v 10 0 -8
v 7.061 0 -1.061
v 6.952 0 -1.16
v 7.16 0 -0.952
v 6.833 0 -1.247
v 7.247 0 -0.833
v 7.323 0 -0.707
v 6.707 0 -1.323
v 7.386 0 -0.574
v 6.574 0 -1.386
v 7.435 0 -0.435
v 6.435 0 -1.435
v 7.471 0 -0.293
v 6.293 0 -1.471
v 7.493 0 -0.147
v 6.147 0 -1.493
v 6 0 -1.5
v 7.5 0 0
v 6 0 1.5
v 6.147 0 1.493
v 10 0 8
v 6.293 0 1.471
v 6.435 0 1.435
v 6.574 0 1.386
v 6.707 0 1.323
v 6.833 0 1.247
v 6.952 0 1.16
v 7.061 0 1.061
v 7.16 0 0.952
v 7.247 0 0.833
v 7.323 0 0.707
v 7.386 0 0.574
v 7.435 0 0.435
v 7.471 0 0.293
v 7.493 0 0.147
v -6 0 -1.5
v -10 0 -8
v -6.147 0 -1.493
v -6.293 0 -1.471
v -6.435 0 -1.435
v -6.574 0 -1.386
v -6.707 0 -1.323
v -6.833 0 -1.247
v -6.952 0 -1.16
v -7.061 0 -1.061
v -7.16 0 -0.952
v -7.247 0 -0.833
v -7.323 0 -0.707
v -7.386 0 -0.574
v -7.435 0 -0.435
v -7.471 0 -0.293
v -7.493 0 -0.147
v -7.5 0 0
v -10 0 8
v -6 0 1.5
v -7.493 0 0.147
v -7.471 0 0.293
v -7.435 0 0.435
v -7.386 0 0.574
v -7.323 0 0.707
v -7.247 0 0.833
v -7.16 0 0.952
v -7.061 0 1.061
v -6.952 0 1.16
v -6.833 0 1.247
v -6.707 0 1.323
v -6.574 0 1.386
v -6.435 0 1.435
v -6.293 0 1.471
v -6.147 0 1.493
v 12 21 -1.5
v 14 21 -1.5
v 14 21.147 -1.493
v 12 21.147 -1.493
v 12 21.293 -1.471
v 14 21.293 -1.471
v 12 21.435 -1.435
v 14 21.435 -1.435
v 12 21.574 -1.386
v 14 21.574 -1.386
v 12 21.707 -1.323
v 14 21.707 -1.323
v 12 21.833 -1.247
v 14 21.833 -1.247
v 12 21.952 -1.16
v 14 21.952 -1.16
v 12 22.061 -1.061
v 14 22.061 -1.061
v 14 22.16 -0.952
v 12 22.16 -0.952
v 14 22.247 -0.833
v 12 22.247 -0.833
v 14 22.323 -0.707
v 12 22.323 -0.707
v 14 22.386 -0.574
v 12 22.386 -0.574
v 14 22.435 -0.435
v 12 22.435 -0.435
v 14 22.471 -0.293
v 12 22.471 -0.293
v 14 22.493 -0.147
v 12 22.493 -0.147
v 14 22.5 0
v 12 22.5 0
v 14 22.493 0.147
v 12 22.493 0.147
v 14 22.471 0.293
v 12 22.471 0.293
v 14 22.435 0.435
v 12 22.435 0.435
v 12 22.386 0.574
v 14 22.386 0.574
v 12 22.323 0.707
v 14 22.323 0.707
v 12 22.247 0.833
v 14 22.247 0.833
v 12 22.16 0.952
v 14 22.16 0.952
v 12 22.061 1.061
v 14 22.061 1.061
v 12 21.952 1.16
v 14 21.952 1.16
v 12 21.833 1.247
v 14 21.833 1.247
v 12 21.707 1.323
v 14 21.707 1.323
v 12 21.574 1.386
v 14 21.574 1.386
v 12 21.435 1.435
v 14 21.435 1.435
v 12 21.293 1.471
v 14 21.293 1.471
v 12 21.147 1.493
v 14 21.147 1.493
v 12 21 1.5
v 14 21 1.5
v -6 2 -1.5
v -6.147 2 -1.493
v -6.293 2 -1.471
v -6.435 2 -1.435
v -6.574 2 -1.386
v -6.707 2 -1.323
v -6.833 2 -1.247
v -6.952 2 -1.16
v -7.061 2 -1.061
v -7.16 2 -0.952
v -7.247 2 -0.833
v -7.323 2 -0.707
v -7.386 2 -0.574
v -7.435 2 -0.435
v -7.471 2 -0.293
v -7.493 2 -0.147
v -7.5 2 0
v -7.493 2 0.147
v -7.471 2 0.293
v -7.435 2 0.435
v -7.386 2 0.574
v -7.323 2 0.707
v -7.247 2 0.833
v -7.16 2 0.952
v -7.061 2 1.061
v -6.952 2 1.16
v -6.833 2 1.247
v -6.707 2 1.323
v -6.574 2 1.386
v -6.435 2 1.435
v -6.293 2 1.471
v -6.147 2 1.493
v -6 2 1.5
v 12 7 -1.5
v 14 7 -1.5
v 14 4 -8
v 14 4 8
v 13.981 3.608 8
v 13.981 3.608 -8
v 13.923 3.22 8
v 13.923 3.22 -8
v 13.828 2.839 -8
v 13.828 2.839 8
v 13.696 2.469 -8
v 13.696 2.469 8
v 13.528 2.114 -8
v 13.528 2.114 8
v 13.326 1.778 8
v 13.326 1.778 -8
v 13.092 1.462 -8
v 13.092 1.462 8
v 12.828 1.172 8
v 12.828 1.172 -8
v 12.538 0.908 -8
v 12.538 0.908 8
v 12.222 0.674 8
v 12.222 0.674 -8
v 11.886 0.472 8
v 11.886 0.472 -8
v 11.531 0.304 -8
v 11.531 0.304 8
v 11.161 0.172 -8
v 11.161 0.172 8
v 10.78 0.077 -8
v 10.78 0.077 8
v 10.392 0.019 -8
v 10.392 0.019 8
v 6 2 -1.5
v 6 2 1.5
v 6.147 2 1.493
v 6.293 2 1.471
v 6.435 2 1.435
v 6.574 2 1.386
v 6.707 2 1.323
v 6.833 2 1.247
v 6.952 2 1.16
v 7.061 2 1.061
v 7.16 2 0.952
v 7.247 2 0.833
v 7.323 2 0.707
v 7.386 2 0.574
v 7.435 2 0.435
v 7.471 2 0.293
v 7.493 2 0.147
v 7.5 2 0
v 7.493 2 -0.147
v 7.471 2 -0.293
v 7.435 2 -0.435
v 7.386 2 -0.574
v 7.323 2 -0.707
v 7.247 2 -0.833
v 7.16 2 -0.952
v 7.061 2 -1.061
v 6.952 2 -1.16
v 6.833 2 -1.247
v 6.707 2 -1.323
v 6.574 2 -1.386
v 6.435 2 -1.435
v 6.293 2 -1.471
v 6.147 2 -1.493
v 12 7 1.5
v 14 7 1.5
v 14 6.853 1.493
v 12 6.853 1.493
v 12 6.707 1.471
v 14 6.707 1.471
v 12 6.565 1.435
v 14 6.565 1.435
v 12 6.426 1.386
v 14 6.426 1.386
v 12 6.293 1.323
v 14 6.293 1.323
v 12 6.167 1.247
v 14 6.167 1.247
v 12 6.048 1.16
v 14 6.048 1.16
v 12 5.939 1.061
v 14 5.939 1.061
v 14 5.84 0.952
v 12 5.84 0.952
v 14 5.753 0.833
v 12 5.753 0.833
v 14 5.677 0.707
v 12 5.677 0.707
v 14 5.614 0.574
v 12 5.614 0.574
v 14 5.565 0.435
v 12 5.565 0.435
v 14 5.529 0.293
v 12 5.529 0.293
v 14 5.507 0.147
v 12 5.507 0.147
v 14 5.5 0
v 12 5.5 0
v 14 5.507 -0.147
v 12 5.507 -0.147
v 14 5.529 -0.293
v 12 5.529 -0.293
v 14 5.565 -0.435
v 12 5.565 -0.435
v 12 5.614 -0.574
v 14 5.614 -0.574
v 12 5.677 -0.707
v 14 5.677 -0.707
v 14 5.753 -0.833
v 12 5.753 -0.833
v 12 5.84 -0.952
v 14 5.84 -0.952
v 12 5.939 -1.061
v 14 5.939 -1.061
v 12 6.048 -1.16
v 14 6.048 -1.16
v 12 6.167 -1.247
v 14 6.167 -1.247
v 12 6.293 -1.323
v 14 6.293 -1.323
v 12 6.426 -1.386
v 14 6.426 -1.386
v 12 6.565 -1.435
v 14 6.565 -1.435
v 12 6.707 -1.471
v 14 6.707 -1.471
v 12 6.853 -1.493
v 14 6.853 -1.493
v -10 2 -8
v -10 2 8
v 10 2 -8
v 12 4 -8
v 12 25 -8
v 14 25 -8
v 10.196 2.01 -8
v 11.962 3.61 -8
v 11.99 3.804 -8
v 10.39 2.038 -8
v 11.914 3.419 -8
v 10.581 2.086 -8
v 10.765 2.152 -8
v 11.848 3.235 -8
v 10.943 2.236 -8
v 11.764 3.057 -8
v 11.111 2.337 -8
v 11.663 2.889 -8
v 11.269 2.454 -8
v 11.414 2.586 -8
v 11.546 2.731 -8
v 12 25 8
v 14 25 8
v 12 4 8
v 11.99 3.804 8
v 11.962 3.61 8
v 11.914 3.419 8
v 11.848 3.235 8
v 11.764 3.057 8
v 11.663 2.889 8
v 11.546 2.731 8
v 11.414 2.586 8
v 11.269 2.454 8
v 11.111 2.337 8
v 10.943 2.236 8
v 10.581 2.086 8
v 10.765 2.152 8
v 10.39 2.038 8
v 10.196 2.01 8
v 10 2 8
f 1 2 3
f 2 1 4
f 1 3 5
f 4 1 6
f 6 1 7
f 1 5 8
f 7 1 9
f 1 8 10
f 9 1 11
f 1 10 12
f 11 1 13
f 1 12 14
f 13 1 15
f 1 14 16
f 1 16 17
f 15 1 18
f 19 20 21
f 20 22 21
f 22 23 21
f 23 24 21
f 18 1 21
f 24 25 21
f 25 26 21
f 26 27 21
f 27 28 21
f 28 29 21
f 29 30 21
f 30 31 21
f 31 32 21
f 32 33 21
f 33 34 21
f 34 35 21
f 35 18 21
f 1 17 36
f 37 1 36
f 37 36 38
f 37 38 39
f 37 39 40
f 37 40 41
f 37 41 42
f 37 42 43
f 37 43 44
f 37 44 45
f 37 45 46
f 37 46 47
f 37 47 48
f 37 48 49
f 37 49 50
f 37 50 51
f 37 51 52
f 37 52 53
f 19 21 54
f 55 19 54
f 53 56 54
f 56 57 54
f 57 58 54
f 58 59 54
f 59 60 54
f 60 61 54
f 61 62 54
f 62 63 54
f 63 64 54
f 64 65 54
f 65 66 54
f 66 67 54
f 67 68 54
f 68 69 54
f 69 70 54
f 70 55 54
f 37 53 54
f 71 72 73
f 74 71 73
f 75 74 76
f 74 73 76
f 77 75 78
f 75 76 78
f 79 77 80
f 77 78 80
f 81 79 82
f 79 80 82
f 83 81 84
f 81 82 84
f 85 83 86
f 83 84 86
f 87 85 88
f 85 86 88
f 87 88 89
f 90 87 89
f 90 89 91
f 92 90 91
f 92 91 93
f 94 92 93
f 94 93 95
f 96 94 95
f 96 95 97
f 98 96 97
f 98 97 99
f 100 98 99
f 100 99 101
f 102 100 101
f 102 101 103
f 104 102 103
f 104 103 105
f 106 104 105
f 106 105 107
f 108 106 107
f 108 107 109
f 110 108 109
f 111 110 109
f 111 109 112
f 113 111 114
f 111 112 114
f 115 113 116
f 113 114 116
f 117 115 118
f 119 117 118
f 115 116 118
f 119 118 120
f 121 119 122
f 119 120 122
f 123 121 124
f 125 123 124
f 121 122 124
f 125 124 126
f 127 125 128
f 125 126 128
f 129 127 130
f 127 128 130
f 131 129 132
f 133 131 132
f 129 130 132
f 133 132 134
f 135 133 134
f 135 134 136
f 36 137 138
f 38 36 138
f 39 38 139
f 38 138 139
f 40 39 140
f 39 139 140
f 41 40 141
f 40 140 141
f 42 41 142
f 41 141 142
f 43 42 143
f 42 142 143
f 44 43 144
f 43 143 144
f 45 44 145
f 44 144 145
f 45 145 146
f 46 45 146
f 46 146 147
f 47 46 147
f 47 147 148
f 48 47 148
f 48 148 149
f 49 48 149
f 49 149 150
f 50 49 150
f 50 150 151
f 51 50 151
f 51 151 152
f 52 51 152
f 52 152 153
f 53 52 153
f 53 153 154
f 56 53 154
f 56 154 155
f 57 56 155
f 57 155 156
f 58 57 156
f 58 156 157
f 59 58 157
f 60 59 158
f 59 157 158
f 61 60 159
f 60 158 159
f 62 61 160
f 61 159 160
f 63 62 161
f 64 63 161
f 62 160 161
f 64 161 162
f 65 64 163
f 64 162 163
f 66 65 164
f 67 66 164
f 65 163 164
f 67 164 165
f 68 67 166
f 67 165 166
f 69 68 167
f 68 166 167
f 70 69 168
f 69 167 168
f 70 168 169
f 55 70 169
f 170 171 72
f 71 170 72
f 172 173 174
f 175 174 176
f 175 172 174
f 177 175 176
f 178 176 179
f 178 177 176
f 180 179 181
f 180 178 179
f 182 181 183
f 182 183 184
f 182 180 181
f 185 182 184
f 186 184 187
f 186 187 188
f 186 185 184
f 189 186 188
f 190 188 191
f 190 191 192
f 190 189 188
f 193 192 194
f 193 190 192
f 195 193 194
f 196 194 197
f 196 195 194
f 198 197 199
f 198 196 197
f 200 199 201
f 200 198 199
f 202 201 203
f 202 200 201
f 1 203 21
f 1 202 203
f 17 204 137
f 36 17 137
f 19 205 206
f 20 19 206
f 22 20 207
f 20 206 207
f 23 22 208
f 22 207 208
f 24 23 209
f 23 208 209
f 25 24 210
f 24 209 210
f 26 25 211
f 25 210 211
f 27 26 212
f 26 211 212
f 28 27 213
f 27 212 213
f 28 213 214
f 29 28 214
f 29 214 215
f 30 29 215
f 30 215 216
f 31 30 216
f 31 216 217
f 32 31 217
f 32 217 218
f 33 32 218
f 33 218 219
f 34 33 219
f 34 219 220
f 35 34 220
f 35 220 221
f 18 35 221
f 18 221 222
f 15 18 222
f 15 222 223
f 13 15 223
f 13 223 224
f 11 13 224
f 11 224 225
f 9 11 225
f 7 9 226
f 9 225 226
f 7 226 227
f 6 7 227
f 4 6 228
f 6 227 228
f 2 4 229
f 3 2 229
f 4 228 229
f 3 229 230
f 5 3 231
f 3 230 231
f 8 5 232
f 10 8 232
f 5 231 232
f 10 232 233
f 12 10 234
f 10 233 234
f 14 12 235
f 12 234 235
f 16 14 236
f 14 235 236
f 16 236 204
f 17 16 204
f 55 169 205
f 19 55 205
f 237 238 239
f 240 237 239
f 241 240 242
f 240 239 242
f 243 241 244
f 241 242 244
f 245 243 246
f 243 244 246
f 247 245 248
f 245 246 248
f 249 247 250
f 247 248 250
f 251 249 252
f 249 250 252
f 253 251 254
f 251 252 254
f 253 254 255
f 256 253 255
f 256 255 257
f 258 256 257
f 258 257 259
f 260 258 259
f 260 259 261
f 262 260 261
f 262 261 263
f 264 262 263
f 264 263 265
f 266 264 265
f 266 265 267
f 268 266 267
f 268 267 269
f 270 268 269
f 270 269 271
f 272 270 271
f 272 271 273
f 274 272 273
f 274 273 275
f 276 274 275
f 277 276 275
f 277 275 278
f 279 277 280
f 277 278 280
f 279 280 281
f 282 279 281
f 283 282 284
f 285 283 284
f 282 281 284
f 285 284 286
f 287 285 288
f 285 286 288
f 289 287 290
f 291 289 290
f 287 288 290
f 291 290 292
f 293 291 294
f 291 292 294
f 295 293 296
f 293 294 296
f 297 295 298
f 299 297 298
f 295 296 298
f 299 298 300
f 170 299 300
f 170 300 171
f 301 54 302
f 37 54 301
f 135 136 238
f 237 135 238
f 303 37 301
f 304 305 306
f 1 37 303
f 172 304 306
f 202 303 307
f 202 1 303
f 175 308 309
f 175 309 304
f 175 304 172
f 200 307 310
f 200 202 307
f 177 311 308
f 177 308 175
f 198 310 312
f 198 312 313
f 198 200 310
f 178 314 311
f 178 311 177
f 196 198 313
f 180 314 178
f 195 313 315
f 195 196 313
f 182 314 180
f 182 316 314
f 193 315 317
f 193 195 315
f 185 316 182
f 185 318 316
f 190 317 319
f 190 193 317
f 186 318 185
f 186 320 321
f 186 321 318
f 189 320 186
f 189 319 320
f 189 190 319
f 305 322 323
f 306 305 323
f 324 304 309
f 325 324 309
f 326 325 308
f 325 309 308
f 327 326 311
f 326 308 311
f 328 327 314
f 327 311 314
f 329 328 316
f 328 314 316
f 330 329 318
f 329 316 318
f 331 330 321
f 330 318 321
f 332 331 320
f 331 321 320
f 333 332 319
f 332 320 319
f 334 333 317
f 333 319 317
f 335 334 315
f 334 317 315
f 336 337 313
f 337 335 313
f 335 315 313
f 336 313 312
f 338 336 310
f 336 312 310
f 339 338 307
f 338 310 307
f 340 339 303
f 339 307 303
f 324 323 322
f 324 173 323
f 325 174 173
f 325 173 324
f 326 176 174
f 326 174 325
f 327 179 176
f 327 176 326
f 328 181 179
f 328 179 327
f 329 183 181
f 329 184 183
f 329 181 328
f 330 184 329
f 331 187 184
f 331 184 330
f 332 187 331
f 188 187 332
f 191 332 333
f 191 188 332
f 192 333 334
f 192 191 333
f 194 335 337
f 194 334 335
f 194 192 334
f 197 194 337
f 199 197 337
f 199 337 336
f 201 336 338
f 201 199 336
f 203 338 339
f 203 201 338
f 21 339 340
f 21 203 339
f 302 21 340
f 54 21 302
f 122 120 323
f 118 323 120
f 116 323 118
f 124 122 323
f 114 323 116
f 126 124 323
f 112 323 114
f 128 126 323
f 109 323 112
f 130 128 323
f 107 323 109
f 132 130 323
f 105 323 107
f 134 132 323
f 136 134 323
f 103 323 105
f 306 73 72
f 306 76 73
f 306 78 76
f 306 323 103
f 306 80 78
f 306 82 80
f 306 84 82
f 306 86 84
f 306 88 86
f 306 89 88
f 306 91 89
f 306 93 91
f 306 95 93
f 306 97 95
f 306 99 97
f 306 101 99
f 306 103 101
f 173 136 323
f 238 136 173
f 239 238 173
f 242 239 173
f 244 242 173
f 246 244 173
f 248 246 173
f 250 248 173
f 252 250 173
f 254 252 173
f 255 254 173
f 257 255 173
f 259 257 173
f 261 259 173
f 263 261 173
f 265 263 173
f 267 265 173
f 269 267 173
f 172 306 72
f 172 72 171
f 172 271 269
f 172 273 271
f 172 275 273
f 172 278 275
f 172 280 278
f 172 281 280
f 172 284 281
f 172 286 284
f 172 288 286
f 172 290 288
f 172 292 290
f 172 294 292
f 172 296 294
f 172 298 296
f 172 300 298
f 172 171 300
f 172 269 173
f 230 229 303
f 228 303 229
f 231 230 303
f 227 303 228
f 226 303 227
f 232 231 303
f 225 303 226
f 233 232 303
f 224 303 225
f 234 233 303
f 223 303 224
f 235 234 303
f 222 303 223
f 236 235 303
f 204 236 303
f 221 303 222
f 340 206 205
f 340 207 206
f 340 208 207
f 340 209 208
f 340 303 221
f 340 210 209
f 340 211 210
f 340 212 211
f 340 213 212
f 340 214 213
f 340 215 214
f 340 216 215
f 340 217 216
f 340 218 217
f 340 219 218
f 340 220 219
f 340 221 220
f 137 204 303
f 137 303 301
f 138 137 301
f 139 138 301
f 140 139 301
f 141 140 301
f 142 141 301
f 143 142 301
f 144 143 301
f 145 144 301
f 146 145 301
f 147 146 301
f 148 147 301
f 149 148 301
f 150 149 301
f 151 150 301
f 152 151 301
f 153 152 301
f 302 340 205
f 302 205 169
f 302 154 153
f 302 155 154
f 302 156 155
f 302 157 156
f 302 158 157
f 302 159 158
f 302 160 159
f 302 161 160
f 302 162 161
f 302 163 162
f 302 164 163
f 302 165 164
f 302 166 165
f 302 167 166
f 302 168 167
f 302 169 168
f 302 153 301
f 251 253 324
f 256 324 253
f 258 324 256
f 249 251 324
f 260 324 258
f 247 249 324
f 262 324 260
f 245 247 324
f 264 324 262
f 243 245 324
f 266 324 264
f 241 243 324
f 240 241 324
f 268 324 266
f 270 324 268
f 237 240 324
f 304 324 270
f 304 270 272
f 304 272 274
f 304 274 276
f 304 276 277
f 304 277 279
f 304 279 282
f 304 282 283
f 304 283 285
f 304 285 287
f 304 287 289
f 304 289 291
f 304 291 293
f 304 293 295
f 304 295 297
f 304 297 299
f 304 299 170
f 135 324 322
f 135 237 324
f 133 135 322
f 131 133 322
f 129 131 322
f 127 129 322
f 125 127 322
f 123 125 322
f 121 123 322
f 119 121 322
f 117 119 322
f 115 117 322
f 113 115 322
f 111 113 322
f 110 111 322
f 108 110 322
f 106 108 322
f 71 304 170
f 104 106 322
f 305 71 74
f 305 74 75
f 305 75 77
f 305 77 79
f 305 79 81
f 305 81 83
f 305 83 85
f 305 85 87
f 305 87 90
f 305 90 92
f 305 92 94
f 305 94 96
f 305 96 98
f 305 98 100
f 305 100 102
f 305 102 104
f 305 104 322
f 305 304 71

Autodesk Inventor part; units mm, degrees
ref_plane "YZ Plane" through (0, 0, 0) normal (1, 0, 0) x (0, 1, 0)
ref_plane "XZ Plane" through (0, 0, 0) normal (0, 1, 0) x (-1, 0, 0)
ref_plane "XY Plane" through (0, 0, 0) normal (0, 0, 1) x (1, 0, 0)
sketch "スケッチ1" plane through (0, 0, 0) normal (0, 1, 0) x (-1, 0, 0)
  line L0 (-10, 8) -> (10, 8)
  line L1 (10, 8) -> (10, -8)
  line L2 (10, -8) -> (-10, -8)
  line L3 (-10, -8) -> (-10, 8)
  line L4 (-10, 8) -> (10, -8) construction
  line L5 (10, 8) -> (-10, -8) construction
  point P0 (0, 0)
  dimension "d0" = 20
  dimension "d1" = 16
extrude "プレート1" add sketch "スケッチ1" along normal blind 2
sketch "スケッチ2" plane through (12, 4, -8) normal (1, 0, 0) x (0, 1, 0)
  line L0 (0, 16) -> (0, 0)
  line L1 (0, 0) -> (21, 0)
  line L2 (21, 0) -> (21, 16)
  line L3 (21, 16) -> (0, 16)
edge flange "フランジ1" height 25 angle 90 thickness 2 bend radius 2 thickness toward (1, 0, 0) relief tear relief width 2 relief depth 1 edges at (10, 2, 0) wall of the first edge with corners at (12, 4, 8) (12, 4, -8) (12, 25, -8) (12, 25, 8)
bend "曲げ1"
corner "コーナー1"
sketch "スケッチ3" plane through (14, 25, 8) normal (1, 0, 0) x (0, 0, -1)
  line L0 (6.5, -4) -> (6.5, -18)
  arc A0 (6.5, -18) -> (9.5, -18) centre (8, -18) ccw
  line L1 (9.5, -18) -> (9.5, -4)
  arc A1 (9.5, -4) -> (6.5, -4) centre (8, -4) ccw
  line L2 (16, 0) -> (16, -21) projected
  line L3 (0, 0) -> (16, 0) projected
  point P0 (8, -25)
  point P1 (8, 0)
  dimension "d19" = 1.5
extrude "押し出し1" cut sketch "スケッチ3" against normal blind 10
sketch "スケッチ4" plane through (0, 2, 0) normal (0, 1, 0) x (1, 0, 0)
  line L0 (-6, -1.5) -> (6, -1.5)
  arc A0 (6, -1.5) -> (6, 1.5) centre (6, 0) ccw
  line L1 (6, 1.5) -> (-6, 1.5)
  arc A1 (-6, 1.5) -> (-6, -1.5) centre (-6, 0) ccw
  line L2 (-10, -8) -> (-10, 8) projected
  line L3 (10, 8) -> (10, -8) projected
  point P0 (0, 0)
  dimension "d23" = 4
  dimension "d24" = 4
  dimension "d25" = 1.5
extrude "押し出し2" cut sketch "スケッチ4" against normal blind 10
equation "\"d2\" = Thickness"
equation "\"d3\" = BendReliefWidth"
equation "\"d4\" = BendReliefDepth"
equation "\"d5\" = MinimumRemnant"
equation "\"d6\" = TransitionRadius"
equation "\"d9\" = BendRadius"
equation "\"d10\" = CornerReliefSize"
equation "\"d11\" = GapSize"
equation "\"d12\" = JacobiRadiusSize"
equation "\"BendRadius\" = Thickness"
equation "\"BendReliefWidth\" = Thickness"
equation "\"BendReliefDepth\" = 0.5 * Thickness"
equation "\"CornerReliefSize\" = 4 * Thickness"
equation "\"MinimumRemnant\" = 2 * Thickness"
equation "\"TransitionRadius\" = BendRadius"
equation "\"JacobiRadiusSize\" = BendRadius"
equation "\"GapSize\" = Thickness"
equation "\"Thickness\" = 2"
properties part number "keyL" material "アルミニウム 6061"
